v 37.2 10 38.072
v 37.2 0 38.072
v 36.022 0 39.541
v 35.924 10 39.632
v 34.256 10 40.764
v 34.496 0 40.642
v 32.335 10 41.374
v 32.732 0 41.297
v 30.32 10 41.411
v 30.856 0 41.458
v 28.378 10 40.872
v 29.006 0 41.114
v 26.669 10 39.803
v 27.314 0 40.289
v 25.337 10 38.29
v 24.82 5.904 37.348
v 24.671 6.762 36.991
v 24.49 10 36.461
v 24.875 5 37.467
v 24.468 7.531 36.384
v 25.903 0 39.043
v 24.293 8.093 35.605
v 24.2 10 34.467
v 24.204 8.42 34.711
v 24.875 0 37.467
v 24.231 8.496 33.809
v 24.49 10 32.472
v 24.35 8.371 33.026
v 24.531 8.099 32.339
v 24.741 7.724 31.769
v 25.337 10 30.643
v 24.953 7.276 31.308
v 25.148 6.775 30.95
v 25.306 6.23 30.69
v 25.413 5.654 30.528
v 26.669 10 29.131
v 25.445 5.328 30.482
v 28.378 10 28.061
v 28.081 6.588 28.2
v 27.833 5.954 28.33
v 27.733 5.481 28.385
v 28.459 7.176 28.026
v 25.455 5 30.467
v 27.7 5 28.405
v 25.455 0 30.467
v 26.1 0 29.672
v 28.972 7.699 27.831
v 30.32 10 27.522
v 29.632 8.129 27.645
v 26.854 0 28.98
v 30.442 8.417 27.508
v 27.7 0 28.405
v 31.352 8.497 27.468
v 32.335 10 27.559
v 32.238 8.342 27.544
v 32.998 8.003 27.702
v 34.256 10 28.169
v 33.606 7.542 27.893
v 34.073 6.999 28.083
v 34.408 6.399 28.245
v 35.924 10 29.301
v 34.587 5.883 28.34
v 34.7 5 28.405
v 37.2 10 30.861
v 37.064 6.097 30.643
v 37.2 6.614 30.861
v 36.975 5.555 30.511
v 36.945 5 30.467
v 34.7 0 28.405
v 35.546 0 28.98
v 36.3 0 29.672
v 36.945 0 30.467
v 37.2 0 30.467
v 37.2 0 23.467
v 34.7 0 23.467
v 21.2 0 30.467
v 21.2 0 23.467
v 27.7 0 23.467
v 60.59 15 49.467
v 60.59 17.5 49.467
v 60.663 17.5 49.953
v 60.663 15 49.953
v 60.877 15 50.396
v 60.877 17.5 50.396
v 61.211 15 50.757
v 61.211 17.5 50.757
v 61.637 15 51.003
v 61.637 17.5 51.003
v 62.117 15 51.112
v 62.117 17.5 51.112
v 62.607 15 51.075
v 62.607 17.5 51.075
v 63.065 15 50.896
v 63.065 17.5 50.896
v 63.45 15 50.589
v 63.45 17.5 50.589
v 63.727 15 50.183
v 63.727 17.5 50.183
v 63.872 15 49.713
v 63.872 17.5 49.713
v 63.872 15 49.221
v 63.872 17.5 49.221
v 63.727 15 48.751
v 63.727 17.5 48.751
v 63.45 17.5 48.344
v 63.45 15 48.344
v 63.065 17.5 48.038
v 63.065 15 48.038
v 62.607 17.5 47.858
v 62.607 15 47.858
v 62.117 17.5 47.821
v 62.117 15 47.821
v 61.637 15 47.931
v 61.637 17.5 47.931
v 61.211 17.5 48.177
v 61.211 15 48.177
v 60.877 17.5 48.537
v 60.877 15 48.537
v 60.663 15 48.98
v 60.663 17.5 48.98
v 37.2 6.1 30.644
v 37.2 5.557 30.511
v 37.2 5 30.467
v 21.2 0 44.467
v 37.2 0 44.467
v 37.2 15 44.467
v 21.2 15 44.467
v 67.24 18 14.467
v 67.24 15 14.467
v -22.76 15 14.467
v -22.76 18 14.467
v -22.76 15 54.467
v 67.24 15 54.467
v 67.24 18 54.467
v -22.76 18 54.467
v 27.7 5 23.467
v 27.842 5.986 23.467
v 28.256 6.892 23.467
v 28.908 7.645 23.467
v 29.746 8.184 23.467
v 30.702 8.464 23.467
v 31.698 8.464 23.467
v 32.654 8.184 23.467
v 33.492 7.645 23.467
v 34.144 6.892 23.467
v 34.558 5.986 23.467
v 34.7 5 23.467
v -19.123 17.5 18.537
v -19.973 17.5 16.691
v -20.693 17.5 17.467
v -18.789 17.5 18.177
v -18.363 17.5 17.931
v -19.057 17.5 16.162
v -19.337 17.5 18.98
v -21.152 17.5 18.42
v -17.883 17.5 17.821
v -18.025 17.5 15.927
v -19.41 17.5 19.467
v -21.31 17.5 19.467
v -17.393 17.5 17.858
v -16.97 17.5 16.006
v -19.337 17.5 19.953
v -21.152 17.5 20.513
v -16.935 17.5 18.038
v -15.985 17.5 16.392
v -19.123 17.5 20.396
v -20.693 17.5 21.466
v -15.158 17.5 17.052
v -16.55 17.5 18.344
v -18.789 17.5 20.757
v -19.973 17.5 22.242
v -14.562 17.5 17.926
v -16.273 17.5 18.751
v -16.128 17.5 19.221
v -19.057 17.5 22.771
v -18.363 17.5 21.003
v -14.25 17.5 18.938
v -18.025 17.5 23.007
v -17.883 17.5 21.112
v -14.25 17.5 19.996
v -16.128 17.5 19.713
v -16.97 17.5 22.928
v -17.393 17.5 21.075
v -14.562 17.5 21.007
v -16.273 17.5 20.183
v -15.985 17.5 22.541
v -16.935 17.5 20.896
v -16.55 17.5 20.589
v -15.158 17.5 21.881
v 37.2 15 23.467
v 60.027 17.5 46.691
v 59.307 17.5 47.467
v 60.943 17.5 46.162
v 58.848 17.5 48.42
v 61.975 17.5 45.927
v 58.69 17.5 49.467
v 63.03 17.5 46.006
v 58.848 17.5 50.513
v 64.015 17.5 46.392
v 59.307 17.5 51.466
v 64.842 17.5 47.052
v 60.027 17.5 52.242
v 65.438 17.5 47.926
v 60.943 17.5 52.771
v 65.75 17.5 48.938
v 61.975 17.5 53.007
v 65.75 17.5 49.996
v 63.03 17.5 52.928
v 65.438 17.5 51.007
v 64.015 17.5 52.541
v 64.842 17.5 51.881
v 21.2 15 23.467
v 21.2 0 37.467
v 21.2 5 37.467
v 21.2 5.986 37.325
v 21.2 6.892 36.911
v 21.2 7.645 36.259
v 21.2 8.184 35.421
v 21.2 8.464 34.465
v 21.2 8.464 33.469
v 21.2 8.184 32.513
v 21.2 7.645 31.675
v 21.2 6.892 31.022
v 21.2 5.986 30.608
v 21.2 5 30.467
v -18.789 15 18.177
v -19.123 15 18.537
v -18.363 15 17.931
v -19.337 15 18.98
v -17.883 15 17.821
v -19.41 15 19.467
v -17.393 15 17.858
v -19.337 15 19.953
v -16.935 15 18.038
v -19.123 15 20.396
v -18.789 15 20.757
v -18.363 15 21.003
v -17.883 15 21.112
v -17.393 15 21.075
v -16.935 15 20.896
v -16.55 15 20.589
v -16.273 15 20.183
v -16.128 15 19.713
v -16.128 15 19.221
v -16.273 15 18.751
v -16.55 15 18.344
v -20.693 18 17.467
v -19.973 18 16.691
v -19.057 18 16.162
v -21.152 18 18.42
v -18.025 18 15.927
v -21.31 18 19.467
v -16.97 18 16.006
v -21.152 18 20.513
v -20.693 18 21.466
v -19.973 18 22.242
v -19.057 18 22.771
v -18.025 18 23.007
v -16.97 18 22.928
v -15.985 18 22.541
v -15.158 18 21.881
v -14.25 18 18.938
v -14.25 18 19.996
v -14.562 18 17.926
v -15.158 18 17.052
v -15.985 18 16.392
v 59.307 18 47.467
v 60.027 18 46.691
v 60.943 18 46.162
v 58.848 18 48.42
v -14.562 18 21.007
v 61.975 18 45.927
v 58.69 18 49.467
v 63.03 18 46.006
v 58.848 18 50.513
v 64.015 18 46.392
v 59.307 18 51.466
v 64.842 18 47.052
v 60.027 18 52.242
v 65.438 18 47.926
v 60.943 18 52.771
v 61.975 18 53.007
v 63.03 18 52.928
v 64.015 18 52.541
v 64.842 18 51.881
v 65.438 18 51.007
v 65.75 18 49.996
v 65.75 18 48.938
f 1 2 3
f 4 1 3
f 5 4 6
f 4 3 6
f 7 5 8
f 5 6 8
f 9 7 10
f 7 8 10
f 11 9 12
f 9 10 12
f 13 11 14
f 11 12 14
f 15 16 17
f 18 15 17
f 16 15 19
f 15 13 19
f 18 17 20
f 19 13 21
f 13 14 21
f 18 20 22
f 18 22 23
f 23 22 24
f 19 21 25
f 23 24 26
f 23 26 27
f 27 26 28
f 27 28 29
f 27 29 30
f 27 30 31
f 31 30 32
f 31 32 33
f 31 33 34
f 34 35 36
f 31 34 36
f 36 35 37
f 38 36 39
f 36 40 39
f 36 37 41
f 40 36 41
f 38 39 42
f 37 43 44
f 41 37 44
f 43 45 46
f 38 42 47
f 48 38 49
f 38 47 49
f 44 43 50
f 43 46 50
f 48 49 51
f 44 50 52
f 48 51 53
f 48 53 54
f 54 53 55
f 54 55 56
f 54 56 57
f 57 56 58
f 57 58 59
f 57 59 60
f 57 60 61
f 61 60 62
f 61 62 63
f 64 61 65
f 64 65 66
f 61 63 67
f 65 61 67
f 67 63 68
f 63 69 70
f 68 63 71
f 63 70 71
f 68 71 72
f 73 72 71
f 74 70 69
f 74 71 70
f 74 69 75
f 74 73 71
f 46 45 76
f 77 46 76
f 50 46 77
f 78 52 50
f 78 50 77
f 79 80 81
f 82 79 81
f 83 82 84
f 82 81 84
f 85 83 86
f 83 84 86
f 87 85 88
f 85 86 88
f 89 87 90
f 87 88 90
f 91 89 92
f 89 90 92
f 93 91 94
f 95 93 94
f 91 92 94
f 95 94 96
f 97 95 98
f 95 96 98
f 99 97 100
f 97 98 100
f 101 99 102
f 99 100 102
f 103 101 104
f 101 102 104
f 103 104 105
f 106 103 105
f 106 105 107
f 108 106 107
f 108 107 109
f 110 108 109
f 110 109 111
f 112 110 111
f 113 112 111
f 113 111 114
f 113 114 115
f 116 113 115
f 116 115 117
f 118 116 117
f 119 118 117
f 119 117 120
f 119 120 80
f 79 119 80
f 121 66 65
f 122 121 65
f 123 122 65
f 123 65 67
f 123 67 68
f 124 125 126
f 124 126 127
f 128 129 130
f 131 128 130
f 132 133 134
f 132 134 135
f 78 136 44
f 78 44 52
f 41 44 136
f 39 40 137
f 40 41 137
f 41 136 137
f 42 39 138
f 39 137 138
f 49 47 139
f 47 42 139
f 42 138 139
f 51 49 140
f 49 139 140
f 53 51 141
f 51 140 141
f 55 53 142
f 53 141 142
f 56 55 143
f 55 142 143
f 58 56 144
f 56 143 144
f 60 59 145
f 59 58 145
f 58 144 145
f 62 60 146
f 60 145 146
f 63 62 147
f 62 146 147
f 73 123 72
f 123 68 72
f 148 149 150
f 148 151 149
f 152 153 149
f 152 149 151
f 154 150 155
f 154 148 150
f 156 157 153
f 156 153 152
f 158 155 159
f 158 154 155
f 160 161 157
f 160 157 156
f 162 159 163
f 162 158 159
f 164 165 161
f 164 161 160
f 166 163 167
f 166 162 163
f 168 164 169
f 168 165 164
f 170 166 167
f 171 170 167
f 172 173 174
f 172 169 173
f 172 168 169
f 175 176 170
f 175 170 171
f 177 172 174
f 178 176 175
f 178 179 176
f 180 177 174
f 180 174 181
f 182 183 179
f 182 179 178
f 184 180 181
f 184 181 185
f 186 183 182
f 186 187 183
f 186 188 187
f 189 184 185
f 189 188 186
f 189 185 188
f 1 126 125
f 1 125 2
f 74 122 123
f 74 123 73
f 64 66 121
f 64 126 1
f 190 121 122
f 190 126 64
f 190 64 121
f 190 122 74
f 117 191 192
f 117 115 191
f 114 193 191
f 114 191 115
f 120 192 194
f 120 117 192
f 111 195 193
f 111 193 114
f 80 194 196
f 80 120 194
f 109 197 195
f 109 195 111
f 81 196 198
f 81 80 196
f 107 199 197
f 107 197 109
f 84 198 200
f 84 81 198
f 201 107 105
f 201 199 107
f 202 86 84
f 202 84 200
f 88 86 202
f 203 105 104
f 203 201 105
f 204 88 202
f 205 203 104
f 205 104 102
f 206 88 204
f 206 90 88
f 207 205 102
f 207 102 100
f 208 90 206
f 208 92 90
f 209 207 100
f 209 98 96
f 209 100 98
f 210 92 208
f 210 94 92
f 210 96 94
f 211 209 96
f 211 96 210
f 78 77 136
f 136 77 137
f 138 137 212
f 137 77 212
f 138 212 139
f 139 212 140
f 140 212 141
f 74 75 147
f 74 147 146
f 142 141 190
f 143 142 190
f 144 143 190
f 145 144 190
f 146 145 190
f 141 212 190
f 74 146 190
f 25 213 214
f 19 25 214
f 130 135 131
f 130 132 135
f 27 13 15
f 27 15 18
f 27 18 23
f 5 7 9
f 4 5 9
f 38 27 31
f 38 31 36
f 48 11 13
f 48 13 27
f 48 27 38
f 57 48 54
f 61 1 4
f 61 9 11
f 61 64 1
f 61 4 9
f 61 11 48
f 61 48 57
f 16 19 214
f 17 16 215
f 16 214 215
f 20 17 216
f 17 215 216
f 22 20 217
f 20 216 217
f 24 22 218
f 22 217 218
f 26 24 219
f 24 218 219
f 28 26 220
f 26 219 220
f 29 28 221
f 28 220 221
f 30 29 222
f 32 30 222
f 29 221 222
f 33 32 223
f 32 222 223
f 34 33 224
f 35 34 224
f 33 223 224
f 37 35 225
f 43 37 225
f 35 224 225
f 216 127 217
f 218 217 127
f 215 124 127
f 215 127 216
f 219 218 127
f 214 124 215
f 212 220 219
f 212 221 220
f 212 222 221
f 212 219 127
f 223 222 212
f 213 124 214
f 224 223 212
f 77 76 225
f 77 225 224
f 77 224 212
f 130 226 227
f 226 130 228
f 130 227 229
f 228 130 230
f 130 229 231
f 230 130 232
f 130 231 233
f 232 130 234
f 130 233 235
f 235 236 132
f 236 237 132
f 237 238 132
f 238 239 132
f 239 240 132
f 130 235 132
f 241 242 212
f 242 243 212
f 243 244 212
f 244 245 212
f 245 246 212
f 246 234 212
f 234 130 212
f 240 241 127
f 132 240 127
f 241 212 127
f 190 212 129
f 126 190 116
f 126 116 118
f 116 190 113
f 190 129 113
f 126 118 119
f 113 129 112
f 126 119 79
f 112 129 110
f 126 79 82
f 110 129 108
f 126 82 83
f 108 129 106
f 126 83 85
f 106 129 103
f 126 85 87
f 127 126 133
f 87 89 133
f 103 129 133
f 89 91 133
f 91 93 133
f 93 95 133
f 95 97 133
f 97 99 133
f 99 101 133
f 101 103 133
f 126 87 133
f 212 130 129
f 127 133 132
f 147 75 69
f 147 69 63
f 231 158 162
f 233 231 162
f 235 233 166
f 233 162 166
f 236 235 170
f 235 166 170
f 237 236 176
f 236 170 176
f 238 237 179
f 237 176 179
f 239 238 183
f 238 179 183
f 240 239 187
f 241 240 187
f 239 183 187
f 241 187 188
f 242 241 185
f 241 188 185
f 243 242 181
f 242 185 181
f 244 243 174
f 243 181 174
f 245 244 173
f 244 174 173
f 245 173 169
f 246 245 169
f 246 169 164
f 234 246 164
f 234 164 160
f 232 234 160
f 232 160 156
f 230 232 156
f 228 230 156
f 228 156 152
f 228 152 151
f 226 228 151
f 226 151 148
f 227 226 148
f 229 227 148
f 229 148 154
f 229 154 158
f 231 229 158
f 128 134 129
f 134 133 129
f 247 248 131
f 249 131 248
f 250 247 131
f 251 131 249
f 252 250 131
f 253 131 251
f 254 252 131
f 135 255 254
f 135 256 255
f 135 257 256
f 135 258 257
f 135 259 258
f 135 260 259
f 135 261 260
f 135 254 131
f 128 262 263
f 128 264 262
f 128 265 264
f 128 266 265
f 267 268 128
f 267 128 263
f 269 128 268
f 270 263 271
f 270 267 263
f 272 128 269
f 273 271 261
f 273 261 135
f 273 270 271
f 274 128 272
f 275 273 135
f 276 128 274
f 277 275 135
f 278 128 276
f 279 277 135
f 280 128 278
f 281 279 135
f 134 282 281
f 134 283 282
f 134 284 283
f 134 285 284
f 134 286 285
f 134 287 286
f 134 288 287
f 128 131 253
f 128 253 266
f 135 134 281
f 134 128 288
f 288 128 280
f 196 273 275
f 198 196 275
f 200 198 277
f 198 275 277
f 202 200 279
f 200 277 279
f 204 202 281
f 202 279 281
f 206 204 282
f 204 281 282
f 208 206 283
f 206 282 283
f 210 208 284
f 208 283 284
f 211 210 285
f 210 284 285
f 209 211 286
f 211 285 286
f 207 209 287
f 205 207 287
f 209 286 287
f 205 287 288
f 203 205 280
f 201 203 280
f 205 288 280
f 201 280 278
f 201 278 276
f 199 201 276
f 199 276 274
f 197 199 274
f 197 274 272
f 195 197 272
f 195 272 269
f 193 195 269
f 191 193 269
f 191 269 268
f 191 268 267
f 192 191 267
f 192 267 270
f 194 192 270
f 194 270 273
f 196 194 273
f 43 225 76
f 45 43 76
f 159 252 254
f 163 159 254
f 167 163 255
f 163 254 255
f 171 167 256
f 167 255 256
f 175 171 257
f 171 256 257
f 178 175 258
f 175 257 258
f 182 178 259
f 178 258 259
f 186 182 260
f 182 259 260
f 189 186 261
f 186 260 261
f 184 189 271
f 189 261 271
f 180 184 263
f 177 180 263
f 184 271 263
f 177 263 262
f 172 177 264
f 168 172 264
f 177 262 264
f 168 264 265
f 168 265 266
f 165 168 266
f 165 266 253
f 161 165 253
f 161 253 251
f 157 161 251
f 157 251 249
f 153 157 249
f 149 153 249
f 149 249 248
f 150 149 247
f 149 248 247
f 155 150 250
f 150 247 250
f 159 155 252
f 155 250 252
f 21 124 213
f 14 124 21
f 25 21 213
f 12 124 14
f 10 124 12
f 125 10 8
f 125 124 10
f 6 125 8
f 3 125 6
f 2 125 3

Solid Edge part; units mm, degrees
sketch "Sketch1" plane through (0, 0, 0) normal (0, -1, 0) x (1, 0, 0)
  line L0 (21.2, 4.4667) -> (41.2, 4.4667)
  line L1 (41.2, 4.4667) -> (41.2, 44.4667)
  line L2 (41.2, 44.4667) -> (21.2, 44.4667)
  line L3 (21.2, 44.4667) -> (21.2, 4.4667)
  dimension "D1" = 20
  dimension "D2" = 40
extrude "Protrusion1" add sketch "Sketch1" against normal blind 15
sketch "Sketch2" plane through (31.2, 0, 24.4667) normal (0, -1, 0) x (1, 0, 0)
  circle A0 centre (0, 10) radius 7
  dimension "D1" = 14
  dimension "D2" = 10
extrude "ExtrudedCutout_1" cut sketch "Sketch2" against normal blind 10
sketch "Sketch3" plane through (21.2, 7.5, 24.4667) normal (-1, 0, 0) x (0, -1, 0)
  line L0 (7.5, 13) -> (2.5, 13)
  arc A0 (2.5, 13) -> (2.5, 6) centre (2.5, 9.5) ccw
  line L1 (2.5, 6) -> (7.5, 6)
  line L2 (7.5, 13) -> (7.5, 6)
  dimension "D1" = 7
  dimension "D2" = 3.5
  dimension "D3" = 5
extrude "Cutout1" cut sketch "Sketch3" against normal through all
sketch "Sketch4" plane through (31.2, 15, 24.4667) normal (0, 1, 0) x (-1, 0, 0)
  line L0 (-10, 20) -> (-6, 20)
  line L1 (-6, 20) -> (-6, -20)
  line L2 (-6, -20) -> (-10, -20)
  line L3 (-10, -20) -> (-10, 20)
  dimension "D1" = 4
extrude "Cutout2" cut sketch "Sketch4" against normal through all
sketch "Sketch5" plane through (28.2, 7.5, 4.4667) normal (0, 0, -1) x (1, 0, 0)
  line L0 (6.5, 7.5) -> (6.5, 2.5)
  arc A0 (6.5, 2.5) -> (-0.5, 2.5) centre (3, 2.5) cw
  line L1 (-0.5, 2.5) -> (-0.5, 7.5)
  line L2 (6.5, 7.5) -> (-0.5, 7.5)
  dimension "D1" = 3.5
  dimension "D2" = 3.5
  dimension "D3" = 5
  dimension "D4" = 5
  dimension "D5" = 3
extrude "Cutout3" cut sketch "Sketch5" against normal up to next
sketch "Sketch6" plane through (28.2, 15, 24.4667) normal (0, 1, 0) x (-1, 0, 0)
  line L0 (-9, -20) -> (7, -20)
  line L1 (7, -20) -> (7, -1)
  line L2 (7, -1) -> (-9, -1)
  line L3 (-9, -1) -> (-9, -20)
  dimension "D1" = 19
extrude "Cutout4" cut sketch "Sketch6" against normal up to next
sketch "Sketch7" plane through (28.2, 15, 33.9667) normal (0, 1, 0) x (-1, 0, 0)
  line L0 (-39.04, 20.5) -> (-39.04, -19.5)
  line L1 (-39.04, -19.5) -> (50.96, -19.5)
  line L2 (50.96, 20.5) -> (50.96, -19.5)
  line L3 (-39.04, 20.5) -> (50.96, 20.5)
  dimension "D1" = 40
  dimension "D2" = 36.04
  dimension "D3" = 90
  dimension "D4" = 40
extrude "ExtrudedProtrusion_2" add sketch "Sketch7" along normal blind 3
sketch "Sketch8" plane through (19.24, 18, 34.4667) normal (0, 1, 0) x (-1, 0, 0)
  circle A0 centre (-43, 15) radius 1.65
  circle A1 centre (37, -15) radius 1.65
  dimension "D1" = 3.3
  dimension "D2" = 5
  dimension "D3" = 5
  dimension "D4" = 3.3
  dimension "D5" = 5
  dimension "D6" = 5
extrude "Cutout5" cut sketch "Sketch8" against normal through all
sketch "Sketch9" plane through (19.24, 18, 34.4667) normal (0, 1, 0) x (-1, 0, 0)
  circle A0 centre (-43, 15) radius 3.55
  circle A1 centre (37, -15) radius 3.55
extrude "ExtrudedCutout_9" cut sketch "Sketch9" against normal blind 0.5
